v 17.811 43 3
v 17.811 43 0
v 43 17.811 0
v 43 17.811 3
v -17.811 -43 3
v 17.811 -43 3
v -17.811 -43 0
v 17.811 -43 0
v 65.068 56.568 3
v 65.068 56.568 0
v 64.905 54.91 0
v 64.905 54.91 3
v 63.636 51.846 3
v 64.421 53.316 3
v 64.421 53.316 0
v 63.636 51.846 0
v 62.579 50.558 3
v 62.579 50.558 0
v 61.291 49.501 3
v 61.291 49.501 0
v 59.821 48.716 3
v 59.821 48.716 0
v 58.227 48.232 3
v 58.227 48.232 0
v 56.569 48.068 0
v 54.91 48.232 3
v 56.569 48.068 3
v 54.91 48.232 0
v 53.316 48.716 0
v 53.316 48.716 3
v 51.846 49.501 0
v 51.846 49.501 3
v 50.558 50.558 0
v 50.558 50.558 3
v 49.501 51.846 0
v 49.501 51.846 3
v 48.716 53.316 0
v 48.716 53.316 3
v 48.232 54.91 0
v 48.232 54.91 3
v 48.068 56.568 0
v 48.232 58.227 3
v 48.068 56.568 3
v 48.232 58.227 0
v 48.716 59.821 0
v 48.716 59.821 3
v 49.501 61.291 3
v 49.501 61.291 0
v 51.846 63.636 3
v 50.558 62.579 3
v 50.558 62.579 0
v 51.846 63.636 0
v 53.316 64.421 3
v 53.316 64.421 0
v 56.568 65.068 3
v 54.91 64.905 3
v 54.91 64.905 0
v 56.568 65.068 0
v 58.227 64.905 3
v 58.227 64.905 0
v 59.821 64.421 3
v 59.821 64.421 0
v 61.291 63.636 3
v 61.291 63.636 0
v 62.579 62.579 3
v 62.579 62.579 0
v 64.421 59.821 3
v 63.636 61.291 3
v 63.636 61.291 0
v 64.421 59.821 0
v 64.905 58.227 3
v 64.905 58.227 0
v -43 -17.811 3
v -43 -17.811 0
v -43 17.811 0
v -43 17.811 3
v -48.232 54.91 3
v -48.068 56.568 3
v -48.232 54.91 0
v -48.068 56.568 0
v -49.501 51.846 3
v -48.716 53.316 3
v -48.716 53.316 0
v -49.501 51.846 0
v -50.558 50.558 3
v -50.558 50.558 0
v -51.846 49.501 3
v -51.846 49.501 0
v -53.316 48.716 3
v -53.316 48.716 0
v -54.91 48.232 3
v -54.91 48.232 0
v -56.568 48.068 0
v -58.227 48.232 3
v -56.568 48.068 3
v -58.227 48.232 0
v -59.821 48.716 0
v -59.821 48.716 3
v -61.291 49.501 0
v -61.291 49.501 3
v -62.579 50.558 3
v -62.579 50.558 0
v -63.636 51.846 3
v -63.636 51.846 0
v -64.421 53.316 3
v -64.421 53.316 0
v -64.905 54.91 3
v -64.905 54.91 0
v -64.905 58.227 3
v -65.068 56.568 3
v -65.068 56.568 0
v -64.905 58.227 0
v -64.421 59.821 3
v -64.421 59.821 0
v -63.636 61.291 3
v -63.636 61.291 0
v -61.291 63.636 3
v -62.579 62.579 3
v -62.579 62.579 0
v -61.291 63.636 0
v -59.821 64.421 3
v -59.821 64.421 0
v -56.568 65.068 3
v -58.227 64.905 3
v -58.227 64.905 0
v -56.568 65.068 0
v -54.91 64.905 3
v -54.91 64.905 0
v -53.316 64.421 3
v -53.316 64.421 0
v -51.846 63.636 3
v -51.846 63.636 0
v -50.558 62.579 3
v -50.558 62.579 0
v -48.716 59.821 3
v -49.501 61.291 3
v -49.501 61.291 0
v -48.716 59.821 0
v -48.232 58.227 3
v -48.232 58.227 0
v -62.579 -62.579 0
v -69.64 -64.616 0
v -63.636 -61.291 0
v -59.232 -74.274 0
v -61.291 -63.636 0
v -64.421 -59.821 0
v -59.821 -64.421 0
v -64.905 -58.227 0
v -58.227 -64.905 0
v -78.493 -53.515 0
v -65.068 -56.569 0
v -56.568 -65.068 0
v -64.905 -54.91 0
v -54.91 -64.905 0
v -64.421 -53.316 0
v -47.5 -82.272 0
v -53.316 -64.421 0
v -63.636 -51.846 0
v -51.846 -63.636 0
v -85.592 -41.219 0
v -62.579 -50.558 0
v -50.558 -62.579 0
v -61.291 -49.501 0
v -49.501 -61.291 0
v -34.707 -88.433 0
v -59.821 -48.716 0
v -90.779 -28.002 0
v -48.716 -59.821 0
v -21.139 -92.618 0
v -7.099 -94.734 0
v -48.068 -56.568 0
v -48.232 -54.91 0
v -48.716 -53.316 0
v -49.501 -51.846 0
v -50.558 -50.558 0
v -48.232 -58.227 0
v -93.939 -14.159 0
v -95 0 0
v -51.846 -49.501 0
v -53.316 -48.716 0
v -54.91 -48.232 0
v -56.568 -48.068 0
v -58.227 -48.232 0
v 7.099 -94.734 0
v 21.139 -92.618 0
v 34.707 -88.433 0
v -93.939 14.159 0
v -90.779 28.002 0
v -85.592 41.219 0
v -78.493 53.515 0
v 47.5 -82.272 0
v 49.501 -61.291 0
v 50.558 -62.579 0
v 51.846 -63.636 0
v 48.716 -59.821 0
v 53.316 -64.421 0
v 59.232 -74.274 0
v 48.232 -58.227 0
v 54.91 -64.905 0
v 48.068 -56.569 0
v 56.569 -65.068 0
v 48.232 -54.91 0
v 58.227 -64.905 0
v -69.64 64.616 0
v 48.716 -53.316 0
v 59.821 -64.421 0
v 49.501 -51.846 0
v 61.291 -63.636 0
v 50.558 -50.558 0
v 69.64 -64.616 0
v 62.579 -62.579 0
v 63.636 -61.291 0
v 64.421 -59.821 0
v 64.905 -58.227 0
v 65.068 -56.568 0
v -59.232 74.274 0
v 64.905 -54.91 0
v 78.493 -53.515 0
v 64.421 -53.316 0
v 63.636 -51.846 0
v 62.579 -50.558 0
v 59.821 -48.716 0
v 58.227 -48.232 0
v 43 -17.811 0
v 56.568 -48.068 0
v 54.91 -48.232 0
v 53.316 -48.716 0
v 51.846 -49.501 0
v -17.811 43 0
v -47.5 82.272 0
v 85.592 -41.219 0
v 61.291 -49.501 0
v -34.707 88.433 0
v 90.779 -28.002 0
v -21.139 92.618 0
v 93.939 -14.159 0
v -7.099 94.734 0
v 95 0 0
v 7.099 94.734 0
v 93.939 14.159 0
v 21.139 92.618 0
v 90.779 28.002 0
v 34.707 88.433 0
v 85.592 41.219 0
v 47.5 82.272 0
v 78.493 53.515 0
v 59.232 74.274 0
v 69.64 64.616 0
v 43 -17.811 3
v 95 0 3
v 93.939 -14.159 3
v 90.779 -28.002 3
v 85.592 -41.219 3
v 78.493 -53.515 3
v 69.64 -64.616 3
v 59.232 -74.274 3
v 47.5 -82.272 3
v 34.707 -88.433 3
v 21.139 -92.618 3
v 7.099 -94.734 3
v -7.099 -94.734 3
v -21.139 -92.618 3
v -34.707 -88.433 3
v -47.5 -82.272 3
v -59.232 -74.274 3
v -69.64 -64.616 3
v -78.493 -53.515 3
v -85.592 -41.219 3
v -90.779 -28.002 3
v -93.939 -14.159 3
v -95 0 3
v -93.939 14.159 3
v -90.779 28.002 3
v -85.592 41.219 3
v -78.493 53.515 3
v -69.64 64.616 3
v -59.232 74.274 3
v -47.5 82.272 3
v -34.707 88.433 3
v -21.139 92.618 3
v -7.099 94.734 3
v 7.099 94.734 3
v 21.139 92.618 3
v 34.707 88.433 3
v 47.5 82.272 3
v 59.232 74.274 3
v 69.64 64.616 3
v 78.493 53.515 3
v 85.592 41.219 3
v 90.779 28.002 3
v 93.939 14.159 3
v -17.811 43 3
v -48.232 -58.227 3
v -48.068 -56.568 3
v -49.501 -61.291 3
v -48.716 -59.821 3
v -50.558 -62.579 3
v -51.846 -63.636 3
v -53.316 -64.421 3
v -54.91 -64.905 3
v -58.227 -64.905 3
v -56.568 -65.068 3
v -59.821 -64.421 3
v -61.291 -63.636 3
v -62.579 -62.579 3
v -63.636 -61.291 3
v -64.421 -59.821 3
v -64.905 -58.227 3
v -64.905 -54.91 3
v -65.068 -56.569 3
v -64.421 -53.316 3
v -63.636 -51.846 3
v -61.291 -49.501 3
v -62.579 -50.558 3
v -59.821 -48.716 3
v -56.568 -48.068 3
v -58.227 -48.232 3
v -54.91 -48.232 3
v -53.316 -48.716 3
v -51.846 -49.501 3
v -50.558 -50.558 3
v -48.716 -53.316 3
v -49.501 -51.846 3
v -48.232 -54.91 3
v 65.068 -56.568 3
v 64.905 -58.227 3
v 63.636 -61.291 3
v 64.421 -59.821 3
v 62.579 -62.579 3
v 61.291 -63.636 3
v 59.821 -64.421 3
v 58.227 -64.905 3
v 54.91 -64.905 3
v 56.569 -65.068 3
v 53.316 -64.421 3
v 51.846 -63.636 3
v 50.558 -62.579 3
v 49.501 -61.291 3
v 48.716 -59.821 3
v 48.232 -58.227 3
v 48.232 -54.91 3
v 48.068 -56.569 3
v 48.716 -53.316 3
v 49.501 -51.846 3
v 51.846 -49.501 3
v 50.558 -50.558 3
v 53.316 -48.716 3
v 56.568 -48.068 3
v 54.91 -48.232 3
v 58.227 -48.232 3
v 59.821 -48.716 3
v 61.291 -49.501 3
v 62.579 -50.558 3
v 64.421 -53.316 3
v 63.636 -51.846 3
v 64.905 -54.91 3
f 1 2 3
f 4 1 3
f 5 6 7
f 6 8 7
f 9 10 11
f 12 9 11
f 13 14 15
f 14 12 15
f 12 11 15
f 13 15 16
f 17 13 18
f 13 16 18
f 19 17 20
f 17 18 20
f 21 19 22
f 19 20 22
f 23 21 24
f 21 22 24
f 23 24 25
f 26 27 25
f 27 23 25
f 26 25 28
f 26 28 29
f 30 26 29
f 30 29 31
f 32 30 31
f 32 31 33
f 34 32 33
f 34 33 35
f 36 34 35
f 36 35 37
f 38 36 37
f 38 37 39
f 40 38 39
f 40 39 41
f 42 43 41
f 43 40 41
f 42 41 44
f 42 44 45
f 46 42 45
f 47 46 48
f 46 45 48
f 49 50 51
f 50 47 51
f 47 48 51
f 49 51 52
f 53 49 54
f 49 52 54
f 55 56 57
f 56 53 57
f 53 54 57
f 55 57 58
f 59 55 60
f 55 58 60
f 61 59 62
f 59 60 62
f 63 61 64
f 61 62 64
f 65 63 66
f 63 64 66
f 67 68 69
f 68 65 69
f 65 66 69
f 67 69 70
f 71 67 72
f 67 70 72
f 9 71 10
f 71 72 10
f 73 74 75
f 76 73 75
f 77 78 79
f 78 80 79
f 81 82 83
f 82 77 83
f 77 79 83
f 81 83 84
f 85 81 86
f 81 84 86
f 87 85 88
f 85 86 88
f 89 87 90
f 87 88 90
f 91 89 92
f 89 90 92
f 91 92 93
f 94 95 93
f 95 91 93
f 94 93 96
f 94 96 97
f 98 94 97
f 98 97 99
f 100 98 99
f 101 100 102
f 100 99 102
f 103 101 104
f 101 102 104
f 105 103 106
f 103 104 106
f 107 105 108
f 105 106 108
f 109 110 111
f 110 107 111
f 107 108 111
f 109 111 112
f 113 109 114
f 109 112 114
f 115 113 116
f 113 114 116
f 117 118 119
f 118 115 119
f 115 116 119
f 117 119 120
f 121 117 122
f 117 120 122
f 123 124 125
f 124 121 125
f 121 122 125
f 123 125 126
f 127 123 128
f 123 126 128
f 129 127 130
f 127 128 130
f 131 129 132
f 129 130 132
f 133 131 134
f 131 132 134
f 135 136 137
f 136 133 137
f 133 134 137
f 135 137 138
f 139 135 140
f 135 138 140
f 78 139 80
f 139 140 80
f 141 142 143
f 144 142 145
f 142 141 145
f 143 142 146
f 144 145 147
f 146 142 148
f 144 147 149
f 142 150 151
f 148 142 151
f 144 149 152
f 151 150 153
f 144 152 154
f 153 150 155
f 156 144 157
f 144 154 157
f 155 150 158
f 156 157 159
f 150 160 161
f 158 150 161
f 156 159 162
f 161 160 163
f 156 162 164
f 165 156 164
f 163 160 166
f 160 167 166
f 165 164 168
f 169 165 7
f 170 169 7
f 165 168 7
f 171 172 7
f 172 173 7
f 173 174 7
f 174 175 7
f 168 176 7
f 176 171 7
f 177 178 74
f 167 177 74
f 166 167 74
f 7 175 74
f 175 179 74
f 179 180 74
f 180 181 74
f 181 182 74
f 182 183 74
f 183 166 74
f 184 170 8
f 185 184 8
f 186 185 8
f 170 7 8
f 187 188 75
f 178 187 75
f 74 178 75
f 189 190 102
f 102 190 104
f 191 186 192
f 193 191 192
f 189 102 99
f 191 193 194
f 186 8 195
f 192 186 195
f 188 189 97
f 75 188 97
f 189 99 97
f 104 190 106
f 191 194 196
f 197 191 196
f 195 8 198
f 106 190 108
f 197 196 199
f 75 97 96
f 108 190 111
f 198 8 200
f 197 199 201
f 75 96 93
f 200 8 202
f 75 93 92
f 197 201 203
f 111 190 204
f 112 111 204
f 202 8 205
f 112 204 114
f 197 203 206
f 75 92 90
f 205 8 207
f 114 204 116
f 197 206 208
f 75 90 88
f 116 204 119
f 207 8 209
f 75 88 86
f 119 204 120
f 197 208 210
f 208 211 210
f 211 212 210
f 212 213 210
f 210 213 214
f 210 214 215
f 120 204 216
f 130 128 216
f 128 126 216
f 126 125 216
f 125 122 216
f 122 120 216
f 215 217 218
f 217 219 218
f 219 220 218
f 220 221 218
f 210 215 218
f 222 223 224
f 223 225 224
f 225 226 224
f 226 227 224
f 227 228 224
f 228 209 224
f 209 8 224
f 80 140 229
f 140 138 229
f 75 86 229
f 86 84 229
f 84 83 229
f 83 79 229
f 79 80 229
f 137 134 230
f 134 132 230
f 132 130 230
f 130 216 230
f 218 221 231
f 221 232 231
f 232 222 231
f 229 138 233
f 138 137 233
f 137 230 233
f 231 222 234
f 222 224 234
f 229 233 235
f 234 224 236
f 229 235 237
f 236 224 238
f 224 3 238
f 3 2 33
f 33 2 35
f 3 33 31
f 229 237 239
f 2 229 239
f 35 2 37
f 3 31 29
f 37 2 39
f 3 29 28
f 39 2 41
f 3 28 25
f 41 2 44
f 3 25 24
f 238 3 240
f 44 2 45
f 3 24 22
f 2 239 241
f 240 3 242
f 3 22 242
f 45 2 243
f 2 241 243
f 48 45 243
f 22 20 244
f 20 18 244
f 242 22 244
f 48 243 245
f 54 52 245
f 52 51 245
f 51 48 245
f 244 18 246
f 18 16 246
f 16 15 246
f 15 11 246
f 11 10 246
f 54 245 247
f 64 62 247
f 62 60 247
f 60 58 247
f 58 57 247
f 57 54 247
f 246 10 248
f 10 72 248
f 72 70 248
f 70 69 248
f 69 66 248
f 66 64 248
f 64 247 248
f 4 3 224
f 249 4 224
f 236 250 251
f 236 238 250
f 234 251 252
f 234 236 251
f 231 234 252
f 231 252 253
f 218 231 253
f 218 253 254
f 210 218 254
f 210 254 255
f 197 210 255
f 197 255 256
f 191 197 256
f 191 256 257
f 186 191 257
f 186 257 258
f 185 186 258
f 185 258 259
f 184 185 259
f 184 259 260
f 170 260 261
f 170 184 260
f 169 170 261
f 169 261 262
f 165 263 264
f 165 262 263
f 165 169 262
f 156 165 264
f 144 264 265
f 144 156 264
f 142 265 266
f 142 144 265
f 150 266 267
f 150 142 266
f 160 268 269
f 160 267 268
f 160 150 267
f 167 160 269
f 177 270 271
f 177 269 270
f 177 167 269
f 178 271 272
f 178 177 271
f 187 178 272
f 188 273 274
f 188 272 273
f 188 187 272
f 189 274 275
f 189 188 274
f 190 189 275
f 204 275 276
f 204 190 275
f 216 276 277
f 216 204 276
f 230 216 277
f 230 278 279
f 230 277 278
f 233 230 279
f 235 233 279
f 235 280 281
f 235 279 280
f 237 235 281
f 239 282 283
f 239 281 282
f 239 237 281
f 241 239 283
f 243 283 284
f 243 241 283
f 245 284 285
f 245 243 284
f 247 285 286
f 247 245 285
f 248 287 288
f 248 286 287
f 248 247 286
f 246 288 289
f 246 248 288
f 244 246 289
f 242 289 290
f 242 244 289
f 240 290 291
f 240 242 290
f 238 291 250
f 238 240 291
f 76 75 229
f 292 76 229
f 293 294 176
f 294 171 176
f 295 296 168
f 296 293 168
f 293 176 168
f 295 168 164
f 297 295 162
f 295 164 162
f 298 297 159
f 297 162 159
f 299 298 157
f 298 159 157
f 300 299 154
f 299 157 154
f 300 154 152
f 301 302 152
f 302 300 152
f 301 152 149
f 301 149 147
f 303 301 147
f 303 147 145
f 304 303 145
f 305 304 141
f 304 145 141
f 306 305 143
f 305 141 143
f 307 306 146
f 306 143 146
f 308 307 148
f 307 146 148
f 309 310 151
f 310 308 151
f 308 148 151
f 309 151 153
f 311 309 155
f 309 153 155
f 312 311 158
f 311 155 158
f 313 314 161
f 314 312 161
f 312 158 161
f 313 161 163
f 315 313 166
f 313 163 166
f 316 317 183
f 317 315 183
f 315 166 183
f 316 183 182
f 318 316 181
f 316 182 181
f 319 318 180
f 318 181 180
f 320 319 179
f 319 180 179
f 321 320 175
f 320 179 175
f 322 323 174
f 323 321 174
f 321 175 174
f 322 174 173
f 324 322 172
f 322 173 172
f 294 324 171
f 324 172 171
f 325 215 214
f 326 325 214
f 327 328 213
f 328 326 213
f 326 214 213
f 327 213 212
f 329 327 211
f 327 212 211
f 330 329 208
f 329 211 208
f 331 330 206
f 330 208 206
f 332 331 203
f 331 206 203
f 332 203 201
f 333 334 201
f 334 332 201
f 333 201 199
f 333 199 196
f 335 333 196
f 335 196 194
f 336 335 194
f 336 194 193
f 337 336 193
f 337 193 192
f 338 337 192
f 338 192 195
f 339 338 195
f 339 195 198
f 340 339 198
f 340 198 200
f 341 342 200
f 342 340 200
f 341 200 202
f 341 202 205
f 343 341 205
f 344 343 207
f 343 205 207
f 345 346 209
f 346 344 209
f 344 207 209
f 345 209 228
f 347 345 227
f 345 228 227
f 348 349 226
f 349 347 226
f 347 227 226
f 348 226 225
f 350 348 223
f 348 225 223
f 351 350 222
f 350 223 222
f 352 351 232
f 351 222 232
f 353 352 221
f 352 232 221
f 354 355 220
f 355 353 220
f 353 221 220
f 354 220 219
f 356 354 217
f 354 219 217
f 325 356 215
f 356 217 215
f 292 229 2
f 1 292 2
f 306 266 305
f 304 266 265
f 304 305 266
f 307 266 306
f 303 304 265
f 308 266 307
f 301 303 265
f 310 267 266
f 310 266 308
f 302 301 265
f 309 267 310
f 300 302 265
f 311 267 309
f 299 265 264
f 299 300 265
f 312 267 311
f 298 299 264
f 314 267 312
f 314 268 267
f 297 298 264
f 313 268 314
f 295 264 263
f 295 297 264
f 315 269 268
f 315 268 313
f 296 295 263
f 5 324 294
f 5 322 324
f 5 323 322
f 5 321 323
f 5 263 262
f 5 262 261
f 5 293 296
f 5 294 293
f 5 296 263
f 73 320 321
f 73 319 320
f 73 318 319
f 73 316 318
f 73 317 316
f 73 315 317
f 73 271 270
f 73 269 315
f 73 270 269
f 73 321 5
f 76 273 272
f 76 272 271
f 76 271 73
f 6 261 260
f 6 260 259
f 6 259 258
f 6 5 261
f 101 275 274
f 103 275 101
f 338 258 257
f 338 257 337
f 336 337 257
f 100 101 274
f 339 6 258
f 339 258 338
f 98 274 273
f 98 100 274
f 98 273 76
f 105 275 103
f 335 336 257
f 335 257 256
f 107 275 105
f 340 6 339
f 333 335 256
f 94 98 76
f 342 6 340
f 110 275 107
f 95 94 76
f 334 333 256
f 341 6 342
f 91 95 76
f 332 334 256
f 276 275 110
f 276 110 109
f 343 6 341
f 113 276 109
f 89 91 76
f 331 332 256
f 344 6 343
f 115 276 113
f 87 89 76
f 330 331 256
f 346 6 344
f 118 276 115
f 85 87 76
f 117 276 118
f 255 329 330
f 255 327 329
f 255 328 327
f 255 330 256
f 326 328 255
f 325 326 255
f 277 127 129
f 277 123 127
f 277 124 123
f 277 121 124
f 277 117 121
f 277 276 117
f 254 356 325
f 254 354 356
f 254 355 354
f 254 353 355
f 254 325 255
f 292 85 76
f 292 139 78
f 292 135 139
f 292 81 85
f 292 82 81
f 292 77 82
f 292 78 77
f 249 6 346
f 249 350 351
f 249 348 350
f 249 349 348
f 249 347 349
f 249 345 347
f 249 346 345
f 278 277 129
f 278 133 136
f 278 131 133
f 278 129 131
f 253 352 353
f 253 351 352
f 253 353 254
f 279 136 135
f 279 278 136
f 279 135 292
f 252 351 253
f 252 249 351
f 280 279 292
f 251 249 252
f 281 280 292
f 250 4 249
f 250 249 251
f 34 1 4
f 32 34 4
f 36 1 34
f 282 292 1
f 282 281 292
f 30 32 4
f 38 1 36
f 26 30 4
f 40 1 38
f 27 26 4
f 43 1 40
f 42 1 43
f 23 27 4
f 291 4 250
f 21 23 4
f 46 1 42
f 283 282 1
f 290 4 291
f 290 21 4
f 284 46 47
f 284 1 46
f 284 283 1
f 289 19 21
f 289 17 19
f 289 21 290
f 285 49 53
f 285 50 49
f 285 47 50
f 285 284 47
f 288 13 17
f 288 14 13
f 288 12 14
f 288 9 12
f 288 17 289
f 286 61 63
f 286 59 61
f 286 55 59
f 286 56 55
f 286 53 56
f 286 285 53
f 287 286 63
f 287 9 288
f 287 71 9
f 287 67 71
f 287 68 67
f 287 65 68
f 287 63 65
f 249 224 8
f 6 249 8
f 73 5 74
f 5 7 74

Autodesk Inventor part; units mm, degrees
ref_plane "YZ Plane" through (0, 0, 0) normal (1, 0, 0) x (0, 1, 0)
ref_plane "XZ Plane" through (0, 0, 0) normal (0, 1, 0) x (-1, 0, 0)
ref_plane "XY Plane" through (0, 0, 0) normal (0, 0, 1) x (1, 0, 0)
sketch "Sketch1" plane through (0, 0, 0) normal (0, 0, 1) x (1, 0, 0)
  circle A0 centre (0, 0) radius 95
  circle A1 centre (-56.5685, 56.5685) radius 8.5
  circle A2 centre (0, 0) radius 80 construction
  circle A3 centre (-56.5685, -56.5685) radius 8.5
  circle A4 centre (56.5685, -56.5685) radius 8.5
  circle A5 centre (56.5685, 56.5685) radius 8.5
  line L0 (17.8112, -43) -> (-17.8112, -43)
  line L1 (-17.8112, -43) -> (-43, -17.8112)
  line L2 (-43, -17.8112) -> (-43, 17.8112)
  line L3 (-43, 17.8112) -> (-17.8112, 43)
  line L4 (-17.8112, 43) -> (17.8112, 43)
  line L5 (17.8112, 43) -> (43, 17.8112)
  line L6 (43, 17.8112) -> (43, -17.8112)
  line L7 (43, -17.8112) -> (17.8112, -43)
  line L8 (0, 0) -> (-30.4056, 30.4056) construction
  dimension "d171" = 160
  dimension "d157" = 190
  dimension "d170" = 17
  dimension "d174" = 360
  dimension "d176" = 86
extrude "Plate5" add sketch "Sketch1" along normal blind 3
properties part number "PRS 9651 DrSysB MAIN  FLANGE_D1200" material "Stainless Steel"
